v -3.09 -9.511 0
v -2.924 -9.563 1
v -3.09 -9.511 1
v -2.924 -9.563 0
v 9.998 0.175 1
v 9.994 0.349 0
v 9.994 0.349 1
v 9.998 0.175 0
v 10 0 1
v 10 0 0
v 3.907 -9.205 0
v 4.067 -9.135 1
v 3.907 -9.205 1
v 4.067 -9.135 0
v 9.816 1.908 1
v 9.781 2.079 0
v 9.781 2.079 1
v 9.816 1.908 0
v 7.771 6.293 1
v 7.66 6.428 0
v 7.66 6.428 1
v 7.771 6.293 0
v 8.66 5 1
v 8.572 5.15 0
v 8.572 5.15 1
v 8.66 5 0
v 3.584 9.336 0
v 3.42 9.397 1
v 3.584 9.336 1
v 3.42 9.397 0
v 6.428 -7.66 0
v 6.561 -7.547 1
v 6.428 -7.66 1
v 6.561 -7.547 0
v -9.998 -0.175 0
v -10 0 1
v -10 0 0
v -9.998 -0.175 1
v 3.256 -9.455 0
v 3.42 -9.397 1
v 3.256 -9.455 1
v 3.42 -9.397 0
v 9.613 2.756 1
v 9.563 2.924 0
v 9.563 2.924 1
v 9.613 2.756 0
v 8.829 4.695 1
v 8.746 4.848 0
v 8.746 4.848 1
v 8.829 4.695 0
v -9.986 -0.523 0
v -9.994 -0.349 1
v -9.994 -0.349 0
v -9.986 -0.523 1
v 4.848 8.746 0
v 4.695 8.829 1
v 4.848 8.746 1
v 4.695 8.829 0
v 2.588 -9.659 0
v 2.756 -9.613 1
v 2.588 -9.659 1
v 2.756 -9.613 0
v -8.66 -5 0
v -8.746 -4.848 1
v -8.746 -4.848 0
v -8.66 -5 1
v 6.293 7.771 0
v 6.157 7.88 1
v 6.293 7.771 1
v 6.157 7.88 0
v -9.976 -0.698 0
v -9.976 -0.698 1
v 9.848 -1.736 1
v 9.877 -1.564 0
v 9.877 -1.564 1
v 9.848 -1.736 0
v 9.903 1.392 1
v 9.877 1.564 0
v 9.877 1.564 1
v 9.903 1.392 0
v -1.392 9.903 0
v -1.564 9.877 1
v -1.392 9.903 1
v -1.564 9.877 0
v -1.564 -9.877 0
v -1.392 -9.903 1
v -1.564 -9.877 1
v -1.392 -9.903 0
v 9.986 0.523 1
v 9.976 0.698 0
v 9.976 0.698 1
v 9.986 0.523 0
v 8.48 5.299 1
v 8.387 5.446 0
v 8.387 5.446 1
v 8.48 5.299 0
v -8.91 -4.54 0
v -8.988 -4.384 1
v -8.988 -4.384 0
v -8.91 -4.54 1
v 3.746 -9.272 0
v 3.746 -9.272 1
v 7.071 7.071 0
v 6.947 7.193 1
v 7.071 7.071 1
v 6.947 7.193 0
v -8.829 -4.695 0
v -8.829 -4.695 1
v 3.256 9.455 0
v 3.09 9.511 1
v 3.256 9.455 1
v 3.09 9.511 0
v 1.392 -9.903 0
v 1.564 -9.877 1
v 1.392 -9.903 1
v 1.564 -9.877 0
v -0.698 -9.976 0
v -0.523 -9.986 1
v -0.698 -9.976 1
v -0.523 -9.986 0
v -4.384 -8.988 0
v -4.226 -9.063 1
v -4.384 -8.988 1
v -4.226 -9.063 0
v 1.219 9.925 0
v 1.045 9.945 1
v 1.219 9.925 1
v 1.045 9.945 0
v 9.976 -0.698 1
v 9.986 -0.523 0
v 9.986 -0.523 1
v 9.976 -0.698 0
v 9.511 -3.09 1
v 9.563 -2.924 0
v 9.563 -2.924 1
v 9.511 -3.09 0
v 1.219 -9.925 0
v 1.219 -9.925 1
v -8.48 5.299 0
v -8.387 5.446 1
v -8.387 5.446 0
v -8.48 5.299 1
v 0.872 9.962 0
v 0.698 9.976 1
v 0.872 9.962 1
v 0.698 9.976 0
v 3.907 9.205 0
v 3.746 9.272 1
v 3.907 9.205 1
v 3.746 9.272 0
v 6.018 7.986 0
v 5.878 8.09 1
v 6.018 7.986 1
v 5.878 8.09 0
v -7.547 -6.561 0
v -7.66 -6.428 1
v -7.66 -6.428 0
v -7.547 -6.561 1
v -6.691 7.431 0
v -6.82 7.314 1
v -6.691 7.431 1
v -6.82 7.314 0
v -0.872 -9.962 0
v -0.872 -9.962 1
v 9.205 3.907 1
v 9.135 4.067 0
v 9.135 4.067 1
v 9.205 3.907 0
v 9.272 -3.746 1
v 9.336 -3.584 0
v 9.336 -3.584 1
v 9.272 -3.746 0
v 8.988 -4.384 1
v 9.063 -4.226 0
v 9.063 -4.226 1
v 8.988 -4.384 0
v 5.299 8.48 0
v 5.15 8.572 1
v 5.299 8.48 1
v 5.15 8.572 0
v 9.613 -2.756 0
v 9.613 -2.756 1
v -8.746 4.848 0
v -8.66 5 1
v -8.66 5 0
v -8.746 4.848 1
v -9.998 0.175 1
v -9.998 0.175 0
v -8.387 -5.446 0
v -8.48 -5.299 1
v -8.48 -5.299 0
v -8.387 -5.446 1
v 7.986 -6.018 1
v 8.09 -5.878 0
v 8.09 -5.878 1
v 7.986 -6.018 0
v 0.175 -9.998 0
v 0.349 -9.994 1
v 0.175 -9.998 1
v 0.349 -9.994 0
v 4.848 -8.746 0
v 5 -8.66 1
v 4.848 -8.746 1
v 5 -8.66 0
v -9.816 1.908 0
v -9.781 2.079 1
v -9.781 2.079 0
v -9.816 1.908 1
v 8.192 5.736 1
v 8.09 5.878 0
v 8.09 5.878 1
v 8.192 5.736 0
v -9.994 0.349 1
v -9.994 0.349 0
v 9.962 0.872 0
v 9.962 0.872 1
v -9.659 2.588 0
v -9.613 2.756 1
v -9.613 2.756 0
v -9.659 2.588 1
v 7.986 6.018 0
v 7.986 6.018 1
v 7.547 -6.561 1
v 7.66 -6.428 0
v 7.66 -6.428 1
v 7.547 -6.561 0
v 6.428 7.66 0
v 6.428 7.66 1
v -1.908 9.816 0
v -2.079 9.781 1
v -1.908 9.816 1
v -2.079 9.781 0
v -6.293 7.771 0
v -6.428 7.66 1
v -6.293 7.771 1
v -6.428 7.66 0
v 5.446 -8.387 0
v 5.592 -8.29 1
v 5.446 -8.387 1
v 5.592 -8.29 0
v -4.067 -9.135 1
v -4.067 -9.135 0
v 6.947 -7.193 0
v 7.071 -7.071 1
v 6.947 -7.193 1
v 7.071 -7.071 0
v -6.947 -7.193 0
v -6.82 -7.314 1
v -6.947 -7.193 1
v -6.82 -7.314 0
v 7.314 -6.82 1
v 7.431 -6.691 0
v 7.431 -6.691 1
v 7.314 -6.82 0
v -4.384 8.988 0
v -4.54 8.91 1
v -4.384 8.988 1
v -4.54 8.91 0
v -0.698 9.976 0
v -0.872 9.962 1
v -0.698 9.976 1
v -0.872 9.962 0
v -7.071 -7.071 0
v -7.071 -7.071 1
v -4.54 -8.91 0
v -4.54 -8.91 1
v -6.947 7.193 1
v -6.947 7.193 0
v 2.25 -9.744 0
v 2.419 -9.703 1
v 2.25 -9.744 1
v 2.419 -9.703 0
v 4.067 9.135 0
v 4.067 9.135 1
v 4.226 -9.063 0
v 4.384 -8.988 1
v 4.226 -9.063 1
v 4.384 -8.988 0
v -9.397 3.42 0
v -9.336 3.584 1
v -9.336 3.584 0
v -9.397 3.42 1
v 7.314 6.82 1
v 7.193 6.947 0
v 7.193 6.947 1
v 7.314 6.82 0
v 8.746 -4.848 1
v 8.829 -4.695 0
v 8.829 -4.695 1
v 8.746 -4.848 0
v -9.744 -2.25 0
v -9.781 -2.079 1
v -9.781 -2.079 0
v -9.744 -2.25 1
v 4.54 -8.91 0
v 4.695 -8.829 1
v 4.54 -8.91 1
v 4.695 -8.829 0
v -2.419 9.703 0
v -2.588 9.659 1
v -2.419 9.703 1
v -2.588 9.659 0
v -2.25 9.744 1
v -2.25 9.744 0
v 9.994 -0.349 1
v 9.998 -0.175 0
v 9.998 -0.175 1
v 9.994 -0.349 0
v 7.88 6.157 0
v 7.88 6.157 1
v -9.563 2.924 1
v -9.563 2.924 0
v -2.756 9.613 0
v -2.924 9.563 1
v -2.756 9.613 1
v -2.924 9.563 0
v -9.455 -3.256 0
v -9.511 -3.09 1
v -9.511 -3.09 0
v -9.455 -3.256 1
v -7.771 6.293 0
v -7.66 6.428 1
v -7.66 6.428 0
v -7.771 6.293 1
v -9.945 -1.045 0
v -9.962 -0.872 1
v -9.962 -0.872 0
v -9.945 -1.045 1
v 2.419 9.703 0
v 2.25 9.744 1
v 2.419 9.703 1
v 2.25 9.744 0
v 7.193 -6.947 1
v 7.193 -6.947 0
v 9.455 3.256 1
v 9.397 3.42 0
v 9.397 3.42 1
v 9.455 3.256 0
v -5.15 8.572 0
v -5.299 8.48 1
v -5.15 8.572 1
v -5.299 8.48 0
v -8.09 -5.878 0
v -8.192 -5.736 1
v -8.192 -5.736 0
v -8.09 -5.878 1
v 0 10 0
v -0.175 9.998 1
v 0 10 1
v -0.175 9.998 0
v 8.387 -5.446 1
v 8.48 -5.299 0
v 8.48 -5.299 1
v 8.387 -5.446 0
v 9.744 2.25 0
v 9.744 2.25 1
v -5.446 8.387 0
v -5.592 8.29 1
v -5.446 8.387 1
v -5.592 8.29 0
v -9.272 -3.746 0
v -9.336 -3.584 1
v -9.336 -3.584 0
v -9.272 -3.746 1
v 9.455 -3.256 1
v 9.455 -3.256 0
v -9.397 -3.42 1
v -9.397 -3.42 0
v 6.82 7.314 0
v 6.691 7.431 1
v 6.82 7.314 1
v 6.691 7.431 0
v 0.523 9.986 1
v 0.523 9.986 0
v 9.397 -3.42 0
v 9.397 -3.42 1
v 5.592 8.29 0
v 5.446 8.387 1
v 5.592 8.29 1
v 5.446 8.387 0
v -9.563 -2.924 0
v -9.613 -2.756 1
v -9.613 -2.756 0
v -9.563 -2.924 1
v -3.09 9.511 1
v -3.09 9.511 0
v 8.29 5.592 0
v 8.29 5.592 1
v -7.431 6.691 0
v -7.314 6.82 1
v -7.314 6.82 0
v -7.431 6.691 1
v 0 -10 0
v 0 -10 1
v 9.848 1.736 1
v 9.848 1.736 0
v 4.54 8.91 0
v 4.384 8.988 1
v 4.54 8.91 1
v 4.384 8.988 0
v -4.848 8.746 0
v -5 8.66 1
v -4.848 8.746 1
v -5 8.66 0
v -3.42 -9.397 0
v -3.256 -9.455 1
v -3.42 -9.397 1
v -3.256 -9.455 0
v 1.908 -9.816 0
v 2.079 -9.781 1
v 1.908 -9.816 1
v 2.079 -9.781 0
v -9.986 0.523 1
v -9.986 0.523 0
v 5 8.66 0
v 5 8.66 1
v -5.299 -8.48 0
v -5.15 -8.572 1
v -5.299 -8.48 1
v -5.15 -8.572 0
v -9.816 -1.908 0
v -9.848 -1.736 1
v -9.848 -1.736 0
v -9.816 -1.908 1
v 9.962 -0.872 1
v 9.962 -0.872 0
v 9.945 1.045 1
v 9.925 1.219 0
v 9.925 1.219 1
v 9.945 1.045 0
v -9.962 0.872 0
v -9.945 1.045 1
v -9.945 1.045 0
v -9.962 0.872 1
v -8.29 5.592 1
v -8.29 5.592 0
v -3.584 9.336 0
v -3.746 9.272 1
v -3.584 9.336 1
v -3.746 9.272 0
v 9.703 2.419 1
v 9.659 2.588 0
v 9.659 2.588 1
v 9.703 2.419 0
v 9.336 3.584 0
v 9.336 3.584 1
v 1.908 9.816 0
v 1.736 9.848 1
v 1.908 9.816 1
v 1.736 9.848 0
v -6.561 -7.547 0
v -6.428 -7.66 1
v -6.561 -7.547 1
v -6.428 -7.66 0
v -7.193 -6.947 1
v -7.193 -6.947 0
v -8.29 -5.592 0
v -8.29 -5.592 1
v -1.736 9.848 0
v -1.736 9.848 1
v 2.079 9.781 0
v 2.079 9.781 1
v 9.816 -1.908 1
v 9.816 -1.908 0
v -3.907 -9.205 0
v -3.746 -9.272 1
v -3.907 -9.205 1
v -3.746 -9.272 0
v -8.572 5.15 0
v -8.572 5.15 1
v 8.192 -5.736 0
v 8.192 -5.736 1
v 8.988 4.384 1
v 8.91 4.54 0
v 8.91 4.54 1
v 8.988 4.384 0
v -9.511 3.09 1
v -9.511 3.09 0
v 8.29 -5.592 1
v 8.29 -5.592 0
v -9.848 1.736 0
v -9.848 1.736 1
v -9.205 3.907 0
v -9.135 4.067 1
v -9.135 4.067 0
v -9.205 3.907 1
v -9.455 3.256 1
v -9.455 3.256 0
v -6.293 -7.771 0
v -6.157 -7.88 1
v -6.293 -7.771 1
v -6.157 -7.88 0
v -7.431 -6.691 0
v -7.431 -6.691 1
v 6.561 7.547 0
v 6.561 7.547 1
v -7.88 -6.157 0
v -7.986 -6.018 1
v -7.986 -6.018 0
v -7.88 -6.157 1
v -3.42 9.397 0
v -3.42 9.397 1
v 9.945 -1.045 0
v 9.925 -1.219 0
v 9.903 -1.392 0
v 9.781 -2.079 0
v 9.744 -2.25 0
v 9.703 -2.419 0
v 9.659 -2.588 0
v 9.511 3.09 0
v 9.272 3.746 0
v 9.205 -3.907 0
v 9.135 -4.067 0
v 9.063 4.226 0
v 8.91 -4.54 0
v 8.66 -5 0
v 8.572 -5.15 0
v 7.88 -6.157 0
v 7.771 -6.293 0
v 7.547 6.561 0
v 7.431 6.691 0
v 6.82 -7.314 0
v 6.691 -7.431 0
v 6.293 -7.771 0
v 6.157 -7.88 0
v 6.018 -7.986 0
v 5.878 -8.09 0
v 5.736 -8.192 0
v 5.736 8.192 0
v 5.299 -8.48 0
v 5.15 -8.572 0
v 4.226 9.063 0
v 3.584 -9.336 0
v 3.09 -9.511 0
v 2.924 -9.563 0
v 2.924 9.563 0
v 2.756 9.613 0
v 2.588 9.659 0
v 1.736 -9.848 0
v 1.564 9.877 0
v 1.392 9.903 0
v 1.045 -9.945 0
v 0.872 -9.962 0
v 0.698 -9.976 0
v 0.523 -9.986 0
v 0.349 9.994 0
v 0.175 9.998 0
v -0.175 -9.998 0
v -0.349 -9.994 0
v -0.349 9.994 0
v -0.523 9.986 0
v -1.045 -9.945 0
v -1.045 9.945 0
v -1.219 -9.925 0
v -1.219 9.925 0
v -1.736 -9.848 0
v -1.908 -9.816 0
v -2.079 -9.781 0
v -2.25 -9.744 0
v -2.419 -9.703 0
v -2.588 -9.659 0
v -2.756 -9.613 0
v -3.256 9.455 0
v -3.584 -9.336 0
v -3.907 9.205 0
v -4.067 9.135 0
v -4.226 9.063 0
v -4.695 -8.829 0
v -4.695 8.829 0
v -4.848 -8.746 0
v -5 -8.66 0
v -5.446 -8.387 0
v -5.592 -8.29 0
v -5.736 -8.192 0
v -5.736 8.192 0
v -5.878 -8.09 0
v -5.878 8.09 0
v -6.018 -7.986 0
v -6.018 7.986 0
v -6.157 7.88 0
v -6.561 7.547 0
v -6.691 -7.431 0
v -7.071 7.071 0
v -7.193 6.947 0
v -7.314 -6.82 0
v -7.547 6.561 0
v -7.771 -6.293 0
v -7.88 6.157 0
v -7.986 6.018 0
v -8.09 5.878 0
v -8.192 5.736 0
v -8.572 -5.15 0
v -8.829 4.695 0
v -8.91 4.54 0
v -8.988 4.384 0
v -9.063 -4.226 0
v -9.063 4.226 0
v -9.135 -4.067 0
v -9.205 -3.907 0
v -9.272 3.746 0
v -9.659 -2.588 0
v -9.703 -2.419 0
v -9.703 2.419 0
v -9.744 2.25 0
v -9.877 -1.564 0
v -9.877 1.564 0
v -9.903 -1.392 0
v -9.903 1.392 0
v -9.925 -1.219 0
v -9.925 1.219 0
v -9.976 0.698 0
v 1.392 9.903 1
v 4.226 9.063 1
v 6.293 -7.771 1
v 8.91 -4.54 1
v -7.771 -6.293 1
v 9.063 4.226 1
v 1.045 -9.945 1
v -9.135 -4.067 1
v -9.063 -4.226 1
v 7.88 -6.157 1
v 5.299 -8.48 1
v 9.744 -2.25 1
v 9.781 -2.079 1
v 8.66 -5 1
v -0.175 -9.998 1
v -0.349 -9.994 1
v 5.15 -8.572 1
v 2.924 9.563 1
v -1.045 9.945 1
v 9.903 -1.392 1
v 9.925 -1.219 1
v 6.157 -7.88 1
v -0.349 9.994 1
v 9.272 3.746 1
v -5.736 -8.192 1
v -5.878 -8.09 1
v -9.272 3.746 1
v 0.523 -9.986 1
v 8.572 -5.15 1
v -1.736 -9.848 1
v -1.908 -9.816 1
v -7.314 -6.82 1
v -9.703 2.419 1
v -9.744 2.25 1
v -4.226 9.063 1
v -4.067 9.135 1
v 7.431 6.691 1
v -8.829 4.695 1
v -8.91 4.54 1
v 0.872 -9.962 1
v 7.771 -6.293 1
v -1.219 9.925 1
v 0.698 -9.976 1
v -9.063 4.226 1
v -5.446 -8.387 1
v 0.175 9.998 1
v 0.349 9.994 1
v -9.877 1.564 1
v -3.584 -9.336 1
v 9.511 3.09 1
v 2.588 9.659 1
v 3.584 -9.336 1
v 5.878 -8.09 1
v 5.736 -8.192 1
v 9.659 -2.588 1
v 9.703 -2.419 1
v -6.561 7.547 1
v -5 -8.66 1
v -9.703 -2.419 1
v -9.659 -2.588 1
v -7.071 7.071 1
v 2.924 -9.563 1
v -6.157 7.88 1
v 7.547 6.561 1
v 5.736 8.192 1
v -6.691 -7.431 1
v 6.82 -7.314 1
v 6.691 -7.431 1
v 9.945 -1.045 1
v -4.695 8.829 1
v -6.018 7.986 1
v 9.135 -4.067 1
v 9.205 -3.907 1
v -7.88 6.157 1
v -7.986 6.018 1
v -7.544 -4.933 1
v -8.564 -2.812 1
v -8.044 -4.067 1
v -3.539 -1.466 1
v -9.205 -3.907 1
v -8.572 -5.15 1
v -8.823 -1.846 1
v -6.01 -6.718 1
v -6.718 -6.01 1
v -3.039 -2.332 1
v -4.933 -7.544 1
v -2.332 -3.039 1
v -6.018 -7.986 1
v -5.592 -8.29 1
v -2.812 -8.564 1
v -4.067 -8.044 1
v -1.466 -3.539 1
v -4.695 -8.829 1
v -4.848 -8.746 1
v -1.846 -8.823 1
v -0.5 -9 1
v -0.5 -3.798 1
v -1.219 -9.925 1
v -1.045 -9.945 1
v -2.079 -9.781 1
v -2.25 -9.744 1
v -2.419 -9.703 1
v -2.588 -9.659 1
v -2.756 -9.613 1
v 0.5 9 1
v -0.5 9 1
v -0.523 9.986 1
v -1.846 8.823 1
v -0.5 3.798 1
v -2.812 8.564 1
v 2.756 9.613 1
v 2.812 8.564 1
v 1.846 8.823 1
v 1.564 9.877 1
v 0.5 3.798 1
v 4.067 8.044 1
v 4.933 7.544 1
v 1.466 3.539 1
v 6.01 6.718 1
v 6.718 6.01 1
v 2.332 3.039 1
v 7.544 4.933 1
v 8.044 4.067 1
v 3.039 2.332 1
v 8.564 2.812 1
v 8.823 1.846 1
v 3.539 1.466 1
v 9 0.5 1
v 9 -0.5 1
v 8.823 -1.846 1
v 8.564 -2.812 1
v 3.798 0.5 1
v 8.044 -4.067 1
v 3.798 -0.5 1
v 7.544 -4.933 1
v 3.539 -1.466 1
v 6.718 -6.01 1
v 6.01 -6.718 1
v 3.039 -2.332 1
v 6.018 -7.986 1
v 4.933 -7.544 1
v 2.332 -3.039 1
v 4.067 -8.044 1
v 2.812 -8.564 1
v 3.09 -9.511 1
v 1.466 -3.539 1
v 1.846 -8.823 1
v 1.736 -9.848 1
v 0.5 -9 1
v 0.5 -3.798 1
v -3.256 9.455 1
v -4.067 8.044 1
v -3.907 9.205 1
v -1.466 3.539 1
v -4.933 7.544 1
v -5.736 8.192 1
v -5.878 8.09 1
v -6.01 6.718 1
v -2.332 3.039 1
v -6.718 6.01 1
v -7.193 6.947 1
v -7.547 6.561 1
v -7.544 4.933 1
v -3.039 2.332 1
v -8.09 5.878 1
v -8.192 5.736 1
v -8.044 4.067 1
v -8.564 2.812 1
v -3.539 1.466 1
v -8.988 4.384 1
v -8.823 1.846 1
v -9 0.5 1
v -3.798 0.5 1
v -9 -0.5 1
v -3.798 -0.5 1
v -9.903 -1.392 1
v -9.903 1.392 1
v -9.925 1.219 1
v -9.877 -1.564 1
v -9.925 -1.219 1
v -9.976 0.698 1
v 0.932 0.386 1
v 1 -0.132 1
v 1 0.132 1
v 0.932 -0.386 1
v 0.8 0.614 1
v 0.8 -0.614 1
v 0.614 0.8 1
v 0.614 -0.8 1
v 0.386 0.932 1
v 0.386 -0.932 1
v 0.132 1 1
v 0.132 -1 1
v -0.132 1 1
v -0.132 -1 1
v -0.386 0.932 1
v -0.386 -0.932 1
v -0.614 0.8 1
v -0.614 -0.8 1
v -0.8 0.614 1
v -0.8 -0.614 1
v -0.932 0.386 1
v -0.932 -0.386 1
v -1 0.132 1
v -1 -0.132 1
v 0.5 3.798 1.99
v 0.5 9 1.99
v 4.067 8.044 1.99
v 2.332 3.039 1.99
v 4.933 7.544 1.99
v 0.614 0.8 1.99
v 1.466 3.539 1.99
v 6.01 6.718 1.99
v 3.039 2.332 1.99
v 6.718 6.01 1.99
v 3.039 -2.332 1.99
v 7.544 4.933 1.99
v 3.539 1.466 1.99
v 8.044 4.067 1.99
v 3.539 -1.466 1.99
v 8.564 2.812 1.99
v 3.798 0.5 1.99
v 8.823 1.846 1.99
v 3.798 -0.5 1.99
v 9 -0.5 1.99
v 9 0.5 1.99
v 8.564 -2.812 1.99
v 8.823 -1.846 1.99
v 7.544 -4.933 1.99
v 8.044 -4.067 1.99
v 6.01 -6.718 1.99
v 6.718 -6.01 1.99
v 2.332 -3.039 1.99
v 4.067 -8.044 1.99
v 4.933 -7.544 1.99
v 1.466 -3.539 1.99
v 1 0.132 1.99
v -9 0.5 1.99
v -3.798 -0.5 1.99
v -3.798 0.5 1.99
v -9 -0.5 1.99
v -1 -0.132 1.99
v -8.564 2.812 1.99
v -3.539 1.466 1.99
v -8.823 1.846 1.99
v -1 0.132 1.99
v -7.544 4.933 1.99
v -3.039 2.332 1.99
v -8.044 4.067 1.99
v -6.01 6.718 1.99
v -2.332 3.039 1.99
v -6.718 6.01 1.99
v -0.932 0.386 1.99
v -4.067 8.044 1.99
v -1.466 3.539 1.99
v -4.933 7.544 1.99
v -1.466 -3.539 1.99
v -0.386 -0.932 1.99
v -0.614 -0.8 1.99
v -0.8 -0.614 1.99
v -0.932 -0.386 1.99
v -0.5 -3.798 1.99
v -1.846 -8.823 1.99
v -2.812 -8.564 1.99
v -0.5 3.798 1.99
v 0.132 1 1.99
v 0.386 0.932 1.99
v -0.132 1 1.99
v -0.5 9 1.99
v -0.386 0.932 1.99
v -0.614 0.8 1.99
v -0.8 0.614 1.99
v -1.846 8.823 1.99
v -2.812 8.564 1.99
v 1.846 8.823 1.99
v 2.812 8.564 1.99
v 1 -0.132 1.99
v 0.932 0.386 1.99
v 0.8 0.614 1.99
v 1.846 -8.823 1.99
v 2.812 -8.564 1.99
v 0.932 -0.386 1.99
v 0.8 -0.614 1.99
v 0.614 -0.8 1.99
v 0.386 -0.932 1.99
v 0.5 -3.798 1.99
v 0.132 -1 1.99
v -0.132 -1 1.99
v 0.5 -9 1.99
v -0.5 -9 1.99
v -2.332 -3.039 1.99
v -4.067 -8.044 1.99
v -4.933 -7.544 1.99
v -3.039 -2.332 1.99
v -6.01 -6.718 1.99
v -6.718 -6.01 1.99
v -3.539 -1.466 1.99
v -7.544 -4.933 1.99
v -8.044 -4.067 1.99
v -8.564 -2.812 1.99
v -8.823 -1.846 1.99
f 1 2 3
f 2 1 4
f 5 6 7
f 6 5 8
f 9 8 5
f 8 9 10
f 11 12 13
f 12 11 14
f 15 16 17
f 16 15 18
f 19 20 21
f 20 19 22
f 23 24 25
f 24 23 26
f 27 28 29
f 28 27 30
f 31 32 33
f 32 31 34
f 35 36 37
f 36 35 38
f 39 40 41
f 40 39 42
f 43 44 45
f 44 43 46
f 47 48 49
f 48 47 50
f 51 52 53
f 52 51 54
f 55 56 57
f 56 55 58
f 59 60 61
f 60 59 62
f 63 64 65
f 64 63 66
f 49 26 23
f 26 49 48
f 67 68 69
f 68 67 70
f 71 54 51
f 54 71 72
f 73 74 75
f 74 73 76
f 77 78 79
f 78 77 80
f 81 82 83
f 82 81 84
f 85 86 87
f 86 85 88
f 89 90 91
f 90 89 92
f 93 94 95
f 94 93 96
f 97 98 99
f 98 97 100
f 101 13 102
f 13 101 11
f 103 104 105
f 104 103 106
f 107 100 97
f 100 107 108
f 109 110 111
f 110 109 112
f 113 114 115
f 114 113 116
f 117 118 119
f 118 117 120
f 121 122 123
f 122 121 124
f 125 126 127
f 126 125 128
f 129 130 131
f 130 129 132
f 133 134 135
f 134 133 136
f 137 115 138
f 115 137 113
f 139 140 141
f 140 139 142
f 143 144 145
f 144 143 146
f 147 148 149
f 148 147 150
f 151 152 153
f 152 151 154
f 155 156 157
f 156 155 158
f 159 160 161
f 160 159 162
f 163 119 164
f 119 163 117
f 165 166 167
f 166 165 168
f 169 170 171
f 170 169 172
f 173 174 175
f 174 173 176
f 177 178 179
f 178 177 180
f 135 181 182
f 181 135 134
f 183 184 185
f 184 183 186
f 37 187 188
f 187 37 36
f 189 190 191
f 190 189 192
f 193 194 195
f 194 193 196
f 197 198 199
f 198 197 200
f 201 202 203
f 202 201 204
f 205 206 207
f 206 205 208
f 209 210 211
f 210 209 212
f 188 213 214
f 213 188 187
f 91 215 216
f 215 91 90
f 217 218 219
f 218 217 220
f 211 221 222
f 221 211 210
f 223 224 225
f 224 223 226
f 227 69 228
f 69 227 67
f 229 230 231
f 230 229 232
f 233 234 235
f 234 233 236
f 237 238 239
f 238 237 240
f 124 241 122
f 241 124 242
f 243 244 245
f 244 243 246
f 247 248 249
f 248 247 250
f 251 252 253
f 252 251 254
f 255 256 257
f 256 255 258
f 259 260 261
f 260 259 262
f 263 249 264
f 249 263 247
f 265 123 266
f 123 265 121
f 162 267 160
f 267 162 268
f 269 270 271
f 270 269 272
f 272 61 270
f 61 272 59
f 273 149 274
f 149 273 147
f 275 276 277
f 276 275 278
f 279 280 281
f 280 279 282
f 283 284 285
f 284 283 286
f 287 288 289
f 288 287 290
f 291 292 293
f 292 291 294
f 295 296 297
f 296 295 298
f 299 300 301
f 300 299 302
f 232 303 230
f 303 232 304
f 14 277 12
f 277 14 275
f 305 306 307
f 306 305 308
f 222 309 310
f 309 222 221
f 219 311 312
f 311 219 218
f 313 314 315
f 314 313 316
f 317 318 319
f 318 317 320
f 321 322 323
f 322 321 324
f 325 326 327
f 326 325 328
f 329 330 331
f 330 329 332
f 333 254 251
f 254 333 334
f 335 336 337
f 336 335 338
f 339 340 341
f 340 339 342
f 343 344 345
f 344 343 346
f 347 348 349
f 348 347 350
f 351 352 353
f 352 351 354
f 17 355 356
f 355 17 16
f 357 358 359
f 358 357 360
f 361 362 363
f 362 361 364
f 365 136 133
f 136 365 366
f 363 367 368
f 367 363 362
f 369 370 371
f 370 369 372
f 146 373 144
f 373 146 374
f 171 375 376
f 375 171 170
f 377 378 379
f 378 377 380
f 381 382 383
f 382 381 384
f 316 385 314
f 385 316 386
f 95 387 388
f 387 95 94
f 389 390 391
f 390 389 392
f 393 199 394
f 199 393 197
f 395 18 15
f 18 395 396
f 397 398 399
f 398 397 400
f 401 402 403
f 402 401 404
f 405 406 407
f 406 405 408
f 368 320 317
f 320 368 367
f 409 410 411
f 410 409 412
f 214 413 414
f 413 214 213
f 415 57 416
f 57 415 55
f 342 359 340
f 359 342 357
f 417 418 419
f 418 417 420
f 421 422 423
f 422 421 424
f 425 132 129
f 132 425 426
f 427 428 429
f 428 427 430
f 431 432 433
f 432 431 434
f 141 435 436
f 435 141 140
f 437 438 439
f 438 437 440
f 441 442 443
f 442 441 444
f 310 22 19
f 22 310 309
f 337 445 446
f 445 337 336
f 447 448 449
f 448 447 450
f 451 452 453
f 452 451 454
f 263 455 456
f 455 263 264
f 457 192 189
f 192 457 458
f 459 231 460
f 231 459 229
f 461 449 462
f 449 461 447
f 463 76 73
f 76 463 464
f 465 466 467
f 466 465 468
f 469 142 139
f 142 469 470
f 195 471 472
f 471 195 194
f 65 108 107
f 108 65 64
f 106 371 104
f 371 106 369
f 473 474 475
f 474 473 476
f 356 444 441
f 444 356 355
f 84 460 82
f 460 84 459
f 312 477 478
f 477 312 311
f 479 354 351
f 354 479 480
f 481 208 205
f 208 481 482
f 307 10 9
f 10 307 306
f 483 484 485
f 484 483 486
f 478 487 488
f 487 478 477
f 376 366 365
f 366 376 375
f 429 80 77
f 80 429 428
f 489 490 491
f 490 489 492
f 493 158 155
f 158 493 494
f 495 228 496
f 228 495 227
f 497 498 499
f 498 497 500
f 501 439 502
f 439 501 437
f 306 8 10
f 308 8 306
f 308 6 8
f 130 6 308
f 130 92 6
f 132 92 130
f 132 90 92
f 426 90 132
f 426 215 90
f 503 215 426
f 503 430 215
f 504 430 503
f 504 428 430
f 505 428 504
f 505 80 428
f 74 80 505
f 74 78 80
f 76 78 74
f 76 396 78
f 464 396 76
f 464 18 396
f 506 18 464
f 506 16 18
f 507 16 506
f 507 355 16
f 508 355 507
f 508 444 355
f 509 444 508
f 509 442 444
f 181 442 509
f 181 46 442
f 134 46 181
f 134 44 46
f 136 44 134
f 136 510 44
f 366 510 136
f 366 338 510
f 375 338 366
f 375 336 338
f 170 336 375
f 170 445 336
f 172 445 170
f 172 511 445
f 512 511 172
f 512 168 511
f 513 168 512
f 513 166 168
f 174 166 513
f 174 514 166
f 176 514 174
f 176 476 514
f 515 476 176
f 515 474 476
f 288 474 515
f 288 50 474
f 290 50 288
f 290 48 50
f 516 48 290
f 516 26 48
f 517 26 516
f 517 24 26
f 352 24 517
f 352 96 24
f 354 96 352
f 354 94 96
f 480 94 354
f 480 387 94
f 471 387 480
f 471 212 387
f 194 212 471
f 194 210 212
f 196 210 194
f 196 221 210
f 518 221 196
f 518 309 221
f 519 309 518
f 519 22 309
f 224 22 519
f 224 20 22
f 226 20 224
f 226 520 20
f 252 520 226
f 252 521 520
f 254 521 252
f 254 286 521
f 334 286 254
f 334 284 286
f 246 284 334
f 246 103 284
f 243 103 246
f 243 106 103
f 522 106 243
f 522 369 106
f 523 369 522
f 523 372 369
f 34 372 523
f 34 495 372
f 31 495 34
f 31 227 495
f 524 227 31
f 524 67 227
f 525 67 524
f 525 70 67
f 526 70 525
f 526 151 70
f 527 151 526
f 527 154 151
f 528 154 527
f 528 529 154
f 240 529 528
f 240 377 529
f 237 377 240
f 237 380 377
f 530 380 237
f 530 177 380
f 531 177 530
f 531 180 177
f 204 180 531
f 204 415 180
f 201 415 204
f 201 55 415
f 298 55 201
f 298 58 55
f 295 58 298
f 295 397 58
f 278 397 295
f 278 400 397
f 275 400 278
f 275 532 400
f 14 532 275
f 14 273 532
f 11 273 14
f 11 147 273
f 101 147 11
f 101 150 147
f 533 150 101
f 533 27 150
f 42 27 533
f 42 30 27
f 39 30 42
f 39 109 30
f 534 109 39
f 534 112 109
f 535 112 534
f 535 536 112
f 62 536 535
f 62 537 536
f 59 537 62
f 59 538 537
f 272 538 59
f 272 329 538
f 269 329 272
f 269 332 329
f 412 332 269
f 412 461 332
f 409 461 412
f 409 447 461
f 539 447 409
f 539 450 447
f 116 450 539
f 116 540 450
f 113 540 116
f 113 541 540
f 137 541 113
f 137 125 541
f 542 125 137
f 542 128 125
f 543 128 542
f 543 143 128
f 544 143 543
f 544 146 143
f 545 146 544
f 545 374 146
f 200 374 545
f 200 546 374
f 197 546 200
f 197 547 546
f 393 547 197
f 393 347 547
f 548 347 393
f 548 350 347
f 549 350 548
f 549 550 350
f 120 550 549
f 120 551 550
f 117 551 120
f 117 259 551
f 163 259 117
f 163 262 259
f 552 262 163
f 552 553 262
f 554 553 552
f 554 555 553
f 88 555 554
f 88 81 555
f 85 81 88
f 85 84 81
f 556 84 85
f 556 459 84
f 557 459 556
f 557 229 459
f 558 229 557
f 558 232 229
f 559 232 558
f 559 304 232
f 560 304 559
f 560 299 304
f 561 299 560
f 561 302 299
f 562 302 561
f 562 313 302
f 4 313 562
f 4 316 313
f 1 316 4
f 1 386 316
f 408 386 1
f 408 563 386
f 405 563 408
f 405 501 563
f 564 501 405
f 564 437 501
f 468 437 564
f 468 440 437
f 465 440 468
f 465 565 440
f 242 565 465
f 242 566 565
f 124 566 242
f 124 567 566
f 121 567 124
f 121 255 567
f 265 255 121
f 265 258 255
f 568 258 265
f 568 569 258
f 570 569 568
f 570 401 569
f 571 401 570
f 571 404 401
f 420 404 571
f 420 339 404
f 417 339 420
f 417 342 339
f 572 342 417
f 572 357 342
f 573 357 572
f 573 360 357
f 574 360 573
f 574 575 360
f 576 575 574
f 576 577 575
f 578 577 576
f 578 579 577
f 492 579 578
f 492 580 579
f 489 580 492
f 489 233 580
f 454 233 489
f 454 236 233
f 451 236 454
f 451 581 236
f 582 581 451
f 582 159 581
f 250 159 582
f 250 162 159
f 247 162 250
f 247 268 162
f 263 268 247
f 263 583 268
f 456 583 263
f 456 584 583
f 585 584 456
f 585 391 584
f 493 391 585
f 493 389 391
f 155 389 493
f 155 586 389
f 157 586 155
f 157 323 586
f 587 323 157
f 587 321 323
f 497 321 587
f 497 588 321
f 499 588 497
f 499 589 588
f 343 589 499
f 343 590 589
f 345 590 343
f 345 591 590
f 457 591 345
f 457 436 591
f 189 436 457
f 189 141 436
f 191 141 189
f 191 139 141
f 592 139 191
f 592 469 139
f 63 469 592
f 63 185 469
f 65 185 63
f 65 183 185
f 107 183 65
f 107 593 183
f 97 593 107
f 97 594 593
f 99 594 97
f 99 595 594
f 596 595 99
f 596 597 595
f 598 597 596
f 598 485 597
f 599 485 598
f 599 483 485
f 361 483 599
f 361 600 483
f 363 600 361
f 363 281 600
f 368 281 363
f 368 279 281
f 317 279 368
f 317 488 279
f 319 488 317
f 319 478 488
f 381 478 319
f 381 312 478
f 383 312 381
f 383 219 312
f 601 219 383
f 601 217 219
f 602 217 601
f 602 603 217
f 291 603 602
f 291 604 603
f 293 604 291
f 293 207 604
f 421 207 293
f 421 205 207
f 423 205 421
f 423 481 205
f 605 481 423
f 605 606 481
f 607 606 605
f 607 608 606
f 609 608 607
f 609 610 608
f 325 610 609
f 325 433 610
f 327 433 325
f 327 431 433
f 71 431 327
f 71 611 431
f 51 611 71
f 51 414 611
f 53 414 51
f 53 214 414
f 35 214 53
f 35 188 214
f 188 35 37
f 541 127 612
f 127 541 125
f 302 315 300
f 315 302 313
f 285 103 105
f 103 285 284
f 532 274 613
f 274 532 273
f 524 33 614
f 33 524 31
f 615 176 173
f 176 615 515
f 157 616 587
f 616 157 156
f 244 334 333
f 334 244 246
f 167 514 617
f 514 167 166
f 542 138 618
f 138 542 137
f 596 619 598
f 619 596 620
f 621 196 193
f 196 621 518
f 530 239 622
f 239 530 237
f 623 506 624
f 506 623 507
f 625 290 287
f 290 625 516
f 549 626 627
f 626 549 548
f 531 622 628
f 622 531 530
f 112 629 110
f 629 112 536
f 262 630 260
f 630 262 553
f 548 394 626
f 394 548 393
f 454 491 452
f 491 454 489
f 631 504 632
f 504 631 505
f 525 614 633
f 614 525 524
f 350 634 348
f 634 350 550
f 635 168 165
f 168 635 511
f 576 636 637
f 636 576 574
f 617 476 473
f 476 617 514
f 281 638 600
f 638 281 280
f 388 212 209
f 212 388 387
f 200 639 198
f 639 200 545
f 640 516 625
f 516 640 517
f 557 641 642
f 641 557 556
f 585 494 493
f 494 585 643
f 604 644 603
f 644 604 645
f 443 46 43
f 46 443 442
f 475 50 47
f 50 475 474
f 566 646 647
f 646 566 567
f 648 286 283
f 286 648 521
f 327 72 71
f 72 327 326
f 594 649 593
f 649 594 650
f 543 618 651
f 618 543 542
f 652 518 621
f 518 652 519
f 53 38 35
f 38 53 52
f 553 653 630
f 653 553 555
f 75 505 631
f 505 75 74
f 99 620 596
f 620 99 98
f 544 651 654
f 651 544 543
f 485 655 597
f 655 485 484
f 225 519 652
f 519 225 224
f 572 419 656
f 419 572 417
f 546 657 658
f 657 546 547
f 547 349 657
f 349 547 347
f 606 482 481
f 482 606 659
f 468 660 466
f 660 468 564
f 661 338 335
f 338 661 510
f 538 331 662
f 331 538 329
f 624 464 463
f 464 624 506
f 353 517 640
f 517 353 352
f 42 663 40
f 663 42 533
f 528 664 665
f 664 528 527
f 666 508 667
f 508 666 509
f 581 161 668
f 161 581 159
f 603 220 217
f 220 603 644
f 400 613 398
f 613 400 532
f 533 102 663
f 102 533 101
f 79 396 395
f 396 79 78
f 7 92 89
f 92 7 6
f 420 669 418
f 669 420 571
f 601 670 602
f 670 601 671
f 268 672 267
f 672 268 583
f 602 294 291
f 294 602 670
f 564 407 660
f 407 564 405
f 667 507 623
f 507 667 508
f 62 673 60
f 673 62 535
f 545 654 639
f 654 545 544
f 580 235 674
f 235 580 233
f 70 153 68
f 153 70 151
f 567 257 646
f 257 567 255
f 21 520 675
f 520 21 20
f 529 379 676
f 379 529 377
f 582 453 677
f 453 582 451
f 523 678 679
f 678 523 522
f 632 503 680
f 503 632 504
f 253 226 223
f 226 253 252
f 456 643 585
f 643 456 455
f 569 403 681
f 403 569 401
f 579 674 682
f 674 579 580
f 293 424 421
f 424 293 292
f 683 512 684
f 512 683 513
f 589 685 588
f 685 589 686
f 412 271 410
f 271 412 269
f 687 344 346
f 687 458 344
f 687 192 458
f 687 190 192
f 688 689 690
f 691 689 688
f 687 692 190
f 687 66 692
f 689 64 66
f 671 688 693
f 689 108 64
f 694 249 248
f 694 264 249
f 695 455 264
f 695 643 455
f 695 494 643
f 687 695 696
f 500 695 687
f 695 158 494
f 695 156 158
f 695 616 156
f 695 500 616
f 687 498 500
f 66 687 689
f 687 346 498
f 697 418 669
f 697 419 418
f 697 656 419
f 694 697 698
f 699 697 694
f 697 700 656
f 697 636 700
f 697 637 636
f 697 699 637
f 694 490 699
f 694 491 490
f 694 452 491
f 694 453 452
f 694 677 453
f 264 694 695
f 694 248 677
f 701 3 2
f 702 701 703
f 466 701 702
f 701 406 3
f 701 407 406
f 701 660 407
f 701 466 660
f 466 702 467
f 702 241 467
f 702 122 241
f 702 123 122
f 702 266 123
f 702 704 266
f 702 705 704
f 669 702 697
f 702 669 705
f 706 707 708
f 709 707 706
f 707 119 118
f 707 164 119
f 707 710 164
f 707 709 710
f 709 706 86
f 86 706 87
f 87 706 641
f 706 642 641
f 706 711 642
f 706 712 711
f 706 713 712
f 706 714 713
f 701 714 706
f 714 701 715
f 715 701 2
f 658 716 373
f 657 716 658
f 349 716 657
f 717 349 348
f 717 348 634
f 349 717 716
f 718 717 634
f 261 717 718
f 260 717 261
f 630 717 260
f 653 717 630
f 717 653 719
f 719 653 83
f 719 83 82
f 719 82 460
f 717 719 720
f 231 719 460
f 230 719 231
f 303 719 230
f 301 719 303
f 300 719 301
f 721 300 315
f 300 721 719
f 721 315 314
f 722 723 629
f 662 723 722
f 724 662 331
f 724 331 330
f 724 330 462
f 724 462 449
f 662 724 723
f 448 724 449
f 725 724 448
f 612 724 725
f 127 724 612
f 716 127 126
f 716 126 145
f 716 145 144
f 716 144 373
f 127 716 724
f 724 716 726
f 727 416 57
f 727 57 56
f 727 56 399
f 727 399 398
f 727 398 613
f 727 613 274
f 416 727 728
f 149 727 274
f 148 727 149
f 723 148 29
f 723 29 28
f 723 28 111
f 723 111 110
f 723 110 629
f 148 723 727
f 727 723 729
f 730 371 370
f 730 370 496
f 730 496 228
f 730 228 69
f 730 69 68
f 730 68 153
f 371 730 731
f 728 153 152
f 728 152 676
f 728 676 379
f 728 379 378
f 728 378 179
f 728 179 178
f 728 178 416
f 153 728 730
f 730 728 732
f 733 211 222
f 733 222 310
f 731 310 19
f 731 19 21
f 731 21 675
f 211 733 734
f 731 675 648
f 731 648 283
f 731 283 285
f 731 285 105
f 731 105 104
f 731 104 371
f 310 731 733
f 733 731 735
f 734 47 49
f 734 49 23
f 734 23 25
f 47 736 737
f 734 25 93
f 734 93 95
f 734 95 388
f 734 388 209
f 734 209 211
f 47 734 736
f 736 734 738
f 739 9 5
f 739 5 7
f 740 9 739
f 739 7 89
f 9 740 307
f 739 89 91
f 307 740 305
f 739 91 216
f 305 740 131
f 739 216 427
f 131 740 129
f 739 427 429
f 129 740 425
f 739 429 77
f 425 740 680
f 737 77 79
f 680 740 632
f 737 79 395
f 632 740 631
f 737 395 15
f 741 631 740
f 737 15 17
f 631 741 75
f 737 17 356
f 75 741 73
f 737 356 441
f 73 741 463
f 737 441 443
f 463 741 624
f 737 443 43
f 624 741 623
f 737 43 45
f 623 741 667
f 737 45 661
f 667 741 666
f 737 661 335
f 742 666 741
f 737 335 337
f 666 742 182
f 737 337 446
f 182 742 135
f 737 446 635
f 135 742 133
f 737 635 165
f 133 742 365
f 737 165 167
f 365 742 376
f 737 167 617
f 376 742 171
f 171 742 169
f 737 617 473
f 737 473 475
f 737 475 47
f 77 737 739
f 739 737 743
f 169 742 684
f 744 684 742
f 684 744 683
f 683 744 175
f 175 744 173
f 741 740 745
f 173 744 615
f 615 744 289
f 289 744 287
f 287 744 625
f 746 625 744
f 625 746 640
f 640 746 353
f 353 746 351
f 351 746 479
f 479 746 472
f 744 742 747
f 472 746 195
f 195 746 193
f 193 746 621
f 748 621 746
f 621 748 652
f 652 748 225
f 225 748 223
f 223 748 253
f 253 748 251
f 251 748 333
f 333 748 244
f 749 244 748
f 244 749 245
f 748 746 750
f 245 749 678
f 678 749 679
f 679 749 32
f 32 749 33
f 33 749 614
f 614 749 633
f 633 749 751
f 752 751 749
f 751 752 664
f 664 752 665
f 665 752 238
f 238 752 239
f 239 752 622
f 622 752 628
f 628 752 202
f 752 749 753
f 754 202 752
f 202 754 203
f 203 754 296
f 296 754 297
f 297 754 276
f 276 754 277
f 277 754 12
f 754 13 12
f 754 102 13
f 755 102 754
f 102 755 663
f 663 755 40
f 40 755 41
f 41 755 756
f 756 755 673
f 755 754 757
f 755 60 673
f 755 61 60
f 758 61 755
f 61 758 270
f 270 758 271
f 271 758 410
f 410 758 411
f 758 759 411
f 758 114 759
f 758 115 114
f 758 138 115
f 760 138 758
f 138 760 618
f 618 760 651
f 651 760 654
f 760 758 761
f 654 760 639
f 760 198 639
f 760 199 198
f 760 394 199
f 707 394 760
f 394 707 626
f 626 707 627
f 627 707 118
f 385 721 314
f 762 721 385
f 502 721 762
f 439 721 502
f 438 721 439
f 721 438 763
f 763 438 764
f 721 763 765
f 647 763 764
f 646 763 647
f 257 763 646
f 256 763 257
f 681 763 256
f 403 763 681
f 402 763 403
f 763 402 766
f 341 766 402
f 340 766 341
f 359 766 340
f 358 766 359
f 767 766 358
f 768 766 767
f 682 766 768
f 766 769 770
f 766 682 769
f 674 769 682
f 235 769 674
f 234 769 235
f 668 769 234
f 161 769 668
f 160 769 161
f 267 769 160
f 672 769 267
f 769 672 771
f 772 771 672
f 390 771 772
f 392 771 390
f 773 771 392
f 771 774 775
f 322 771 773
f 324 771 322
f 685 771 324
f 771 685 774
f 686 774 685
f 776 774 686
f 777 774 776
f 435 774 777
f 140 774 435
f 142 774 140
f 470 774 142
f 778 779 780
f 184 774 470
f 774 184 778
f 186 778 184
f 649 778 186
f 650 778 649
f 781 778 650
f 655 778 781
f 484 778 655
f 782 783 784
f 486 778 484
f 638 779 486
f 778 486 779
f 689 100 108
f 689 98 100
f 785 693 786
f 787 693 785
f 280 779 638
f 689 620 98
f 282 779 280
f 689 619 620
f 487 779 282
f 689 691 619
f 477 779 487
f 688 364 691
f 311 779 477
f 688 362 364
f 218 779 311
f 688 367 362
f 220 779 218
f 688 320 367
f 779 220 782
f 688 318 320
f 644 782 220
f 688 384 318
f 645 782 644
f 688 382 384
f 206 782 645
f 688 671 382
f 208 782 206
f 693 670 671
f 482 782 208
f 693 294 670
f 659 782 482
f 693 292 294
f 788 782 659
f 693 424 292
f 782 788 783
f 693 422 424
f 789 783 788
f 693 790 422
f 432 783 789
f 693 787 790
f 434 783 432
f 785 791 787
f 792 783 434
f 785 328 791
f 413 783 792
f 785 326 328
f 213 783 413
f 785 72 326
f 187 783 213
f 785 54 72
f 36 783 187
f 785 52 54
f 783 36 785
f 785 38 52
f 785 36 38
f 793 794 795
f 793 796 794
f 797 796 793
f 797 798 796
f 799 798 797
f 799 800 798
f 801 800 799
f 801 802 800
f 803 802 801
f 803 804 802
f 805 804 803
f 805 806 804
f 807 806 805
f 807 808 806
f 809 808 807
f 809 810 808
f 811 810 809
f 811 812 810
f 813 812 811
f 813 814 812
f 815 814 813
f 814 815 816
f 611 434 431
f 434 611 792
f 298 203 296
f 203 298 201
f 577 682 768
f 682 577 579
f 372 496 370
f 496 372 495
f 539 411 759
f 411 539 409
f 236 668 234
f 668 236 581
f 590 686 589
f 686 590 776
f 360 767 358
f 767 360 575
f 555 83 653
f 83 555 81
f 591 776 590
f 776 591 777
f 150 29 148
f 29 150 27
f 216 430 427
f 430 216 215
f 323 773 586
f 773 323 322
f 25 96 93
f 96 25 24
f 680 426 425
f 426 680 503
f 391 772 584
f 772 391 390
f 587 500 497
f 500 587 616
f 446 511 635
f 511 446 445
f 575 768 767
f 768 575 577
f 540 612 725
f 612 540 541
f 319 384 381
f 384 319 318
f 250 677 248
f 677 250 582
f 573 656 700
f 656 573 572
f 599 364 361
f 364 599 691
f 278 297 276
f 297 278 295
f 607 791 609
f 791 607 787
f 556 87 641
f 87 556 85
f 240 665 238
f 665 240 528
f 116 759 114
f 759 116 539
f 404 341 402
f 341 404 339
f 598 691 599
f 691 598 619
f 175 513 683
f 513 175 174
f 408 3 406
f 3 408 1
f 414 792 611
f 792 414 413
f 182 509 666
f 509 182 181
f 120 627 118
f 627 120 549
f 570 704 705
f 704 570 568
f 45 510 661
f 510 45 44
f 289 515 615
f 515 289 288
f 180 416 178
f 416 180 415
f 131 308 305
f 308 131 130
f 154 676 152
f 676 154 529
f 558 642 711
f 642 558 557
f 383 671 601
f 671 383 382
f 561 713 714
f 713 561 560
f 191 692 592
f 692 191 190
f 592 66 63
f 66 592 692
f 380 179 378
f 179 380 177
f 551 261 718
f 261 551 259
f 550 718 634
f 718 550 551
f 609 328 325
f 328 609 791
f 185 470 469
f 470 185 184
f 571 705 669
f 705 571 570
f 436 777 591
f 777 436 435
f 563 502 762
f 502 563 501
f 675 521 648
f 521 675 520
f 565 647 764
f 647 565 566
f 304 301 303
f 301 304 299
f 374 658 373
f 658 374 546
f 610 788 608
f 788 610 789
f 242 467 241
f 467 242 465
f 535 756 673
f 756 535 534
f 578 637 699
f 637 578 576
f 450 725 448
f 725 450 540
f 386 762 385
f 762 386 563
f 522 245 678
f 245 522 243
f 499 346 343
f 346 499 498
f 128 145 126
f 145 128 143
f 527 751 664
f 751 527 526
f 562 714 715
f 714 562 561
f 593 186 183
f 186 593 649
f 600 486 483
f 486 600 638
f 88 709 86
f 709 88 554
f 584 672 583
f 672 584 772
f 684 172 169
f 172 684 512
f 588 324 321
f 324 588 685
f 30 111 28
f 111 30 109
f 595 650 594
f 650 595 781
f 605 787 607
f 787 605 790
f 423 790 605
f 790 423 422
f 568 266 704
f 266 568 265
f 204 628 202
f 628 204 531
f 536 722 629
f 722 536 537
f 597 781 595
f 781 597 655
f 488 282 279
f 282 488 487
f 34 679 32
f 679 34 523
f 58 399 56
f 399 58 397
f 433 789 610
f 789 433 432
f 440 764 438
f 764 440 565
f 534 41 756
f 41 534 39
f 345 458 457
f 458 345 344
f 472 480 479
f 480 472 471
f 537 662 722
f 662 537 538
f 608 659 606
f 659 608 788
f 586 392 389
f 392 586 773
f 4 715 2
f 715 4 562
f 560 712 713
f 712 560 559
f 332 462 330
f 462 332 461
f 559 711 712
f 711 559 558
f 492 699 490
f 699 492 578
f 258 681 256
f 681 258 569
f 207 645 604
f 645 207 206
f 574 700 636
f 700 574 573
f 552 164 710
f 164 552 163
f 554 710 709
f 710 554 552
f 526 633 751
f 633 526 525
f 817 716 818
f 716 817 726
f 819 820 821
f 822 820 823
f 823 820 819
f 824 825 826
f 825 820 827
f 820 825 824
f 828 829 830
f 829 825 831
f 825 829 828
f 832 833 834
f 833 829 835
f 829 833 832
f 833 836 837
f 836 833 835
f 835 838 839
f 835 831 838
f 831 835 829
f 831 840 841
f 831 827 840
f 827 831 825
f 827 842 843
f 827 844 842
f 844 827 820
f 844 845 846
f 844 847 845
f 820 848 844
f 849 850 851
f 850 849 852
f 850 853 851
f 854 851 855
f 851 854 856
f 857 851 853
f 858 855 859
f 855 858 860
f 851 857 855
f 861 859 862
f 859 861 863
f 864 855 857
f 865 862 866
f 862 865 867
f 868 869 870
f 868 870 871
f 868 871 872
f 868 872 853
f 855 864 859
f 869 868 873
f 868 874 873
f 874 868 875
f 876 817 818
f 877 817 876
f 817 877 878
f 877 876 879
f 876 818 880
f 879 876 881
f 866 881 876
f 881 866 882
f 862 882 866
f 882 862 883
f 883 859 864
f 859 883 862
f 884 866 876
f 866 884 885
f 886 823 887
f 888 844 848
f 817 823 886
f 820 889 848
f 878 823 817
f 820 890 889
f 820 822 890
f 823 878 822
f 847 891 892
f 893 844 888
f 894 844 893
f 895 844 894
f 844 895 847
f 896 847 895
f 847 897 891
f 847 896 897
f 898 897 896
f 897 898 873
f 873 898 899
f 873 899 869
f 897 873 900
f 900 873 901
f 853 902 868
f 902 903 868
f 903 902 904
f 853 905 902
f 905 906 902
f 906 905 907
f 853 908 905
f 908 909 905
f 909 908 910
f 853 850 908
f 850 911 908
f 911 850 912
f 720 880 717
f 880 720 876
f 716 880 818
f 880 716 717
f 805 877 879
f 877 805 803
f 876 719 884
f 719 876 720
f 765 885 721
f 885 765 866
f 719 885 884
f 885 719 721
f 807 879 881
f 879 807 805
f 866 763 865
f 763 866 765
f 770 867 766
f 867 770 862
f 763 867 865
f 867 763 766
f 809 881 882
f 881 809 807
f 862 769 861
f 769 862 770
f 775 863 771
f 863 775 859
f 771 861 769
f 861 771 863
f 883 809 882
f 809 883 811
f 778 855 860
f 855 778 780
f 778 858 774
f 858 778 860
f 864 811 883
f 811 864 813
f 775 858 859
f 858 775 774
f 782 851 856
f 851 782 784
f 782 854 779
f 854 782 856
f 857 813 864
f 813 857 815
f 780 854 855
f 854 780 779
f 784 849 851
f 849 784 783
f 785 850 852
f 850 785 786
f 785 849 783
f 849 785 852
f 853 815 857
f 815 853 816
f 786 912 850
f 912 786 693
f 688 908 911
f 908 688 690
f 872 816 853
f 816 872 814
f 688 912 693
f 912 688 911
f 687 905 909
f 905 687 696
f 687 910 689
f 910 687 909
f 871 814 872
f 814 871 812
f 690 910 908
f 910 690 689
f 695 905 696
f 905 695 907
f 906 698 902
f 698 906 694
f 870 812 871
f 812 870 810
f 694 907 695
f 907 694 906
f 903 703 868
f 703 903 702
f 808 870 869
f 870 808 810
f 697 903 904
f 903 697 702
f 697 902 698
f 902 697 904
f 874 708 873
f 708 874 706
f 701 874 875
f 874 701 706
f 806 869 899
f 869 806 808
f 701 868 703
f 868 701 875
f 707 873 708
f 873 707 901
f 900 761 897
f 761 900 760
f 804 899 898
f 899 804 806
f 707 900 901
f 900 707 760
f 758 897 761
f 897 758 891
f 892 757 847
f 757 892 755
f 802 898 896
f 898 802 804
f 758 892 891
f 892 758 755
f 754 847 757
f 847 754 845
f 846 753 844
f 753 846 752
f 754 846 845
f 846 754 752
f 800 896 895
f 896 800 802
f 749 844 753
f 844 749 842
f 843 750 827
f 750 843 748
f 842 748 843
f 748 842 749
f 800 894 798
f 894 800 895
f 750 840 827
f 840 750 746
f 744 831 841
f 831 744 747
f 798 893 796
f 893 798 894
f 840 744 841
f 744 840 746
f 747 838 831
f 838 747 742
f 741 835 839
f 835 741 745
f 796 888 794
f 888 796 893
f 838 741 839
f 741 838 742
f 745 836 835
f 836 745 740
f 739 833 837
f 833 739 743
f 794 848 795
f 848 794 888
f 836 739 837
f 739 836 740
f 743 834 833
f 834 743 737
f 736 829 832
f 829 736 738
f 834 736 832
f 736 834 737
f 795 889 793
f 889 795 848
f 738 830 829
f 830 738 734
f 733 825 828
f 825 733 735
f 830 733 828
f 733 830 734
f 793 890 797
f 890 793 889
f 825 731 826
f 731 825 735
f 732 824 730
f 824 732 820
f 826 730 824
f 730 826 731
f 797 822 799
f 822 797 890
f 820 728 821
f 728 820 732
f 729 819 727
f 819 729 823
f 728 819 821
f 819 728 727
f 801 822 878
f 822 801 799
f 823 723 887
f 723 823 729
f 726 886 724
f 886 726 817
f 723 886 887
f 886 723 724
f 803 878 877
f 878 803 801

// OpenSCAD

unit="first";  // [first:mm,second:inch] 


//outer diameter is 20mm more
innerDiametermm=0; //[0:180]


//outer diameter is 1 inch more
innerDiameterinch=0; //[0:7]
//1/16 inch
innerDiameter16stinch=0; //[0:15]

makePart();

module makePart(){
    if(unit=="first"){
        smm(innerDiametermm);
    }
    else{
        sinch(innerDiameterinch,innerDiameter16stinch);
    }
}



module smm(d){
    difference(){
        cylinder(1,d/2+10,d/2+10,$fn=360);
        translate([0,0,-1])
         cylinder(3,d/2,d/2,$fn=360);
        
        }
        
    for(i=[0:15:345])
    rotate(a=i,v=[0,0,1])    
    translate([-0.5,d/2+1,0.99])   
    cube([1,8,1]);
}

module sinch(da,db){
    difference(){
        cylinder(1,(da+db/16)*25.4/2+12.7,(da+db/16)*25.4/2+12.7,$fn=360);
        translate([0,0,-1])
         cylinder(3,(da+db/16)*25.4/2,(da+db/16)*24.4/2,$fn=360);
        
        }
        
    for(i=[0:15:345])
    rotate(a=i,v=[0,0,1])    
    translate([-0.5,(da+db/16)*25.4/2+1,0.99])   
    cube([1,10,1]);
}

